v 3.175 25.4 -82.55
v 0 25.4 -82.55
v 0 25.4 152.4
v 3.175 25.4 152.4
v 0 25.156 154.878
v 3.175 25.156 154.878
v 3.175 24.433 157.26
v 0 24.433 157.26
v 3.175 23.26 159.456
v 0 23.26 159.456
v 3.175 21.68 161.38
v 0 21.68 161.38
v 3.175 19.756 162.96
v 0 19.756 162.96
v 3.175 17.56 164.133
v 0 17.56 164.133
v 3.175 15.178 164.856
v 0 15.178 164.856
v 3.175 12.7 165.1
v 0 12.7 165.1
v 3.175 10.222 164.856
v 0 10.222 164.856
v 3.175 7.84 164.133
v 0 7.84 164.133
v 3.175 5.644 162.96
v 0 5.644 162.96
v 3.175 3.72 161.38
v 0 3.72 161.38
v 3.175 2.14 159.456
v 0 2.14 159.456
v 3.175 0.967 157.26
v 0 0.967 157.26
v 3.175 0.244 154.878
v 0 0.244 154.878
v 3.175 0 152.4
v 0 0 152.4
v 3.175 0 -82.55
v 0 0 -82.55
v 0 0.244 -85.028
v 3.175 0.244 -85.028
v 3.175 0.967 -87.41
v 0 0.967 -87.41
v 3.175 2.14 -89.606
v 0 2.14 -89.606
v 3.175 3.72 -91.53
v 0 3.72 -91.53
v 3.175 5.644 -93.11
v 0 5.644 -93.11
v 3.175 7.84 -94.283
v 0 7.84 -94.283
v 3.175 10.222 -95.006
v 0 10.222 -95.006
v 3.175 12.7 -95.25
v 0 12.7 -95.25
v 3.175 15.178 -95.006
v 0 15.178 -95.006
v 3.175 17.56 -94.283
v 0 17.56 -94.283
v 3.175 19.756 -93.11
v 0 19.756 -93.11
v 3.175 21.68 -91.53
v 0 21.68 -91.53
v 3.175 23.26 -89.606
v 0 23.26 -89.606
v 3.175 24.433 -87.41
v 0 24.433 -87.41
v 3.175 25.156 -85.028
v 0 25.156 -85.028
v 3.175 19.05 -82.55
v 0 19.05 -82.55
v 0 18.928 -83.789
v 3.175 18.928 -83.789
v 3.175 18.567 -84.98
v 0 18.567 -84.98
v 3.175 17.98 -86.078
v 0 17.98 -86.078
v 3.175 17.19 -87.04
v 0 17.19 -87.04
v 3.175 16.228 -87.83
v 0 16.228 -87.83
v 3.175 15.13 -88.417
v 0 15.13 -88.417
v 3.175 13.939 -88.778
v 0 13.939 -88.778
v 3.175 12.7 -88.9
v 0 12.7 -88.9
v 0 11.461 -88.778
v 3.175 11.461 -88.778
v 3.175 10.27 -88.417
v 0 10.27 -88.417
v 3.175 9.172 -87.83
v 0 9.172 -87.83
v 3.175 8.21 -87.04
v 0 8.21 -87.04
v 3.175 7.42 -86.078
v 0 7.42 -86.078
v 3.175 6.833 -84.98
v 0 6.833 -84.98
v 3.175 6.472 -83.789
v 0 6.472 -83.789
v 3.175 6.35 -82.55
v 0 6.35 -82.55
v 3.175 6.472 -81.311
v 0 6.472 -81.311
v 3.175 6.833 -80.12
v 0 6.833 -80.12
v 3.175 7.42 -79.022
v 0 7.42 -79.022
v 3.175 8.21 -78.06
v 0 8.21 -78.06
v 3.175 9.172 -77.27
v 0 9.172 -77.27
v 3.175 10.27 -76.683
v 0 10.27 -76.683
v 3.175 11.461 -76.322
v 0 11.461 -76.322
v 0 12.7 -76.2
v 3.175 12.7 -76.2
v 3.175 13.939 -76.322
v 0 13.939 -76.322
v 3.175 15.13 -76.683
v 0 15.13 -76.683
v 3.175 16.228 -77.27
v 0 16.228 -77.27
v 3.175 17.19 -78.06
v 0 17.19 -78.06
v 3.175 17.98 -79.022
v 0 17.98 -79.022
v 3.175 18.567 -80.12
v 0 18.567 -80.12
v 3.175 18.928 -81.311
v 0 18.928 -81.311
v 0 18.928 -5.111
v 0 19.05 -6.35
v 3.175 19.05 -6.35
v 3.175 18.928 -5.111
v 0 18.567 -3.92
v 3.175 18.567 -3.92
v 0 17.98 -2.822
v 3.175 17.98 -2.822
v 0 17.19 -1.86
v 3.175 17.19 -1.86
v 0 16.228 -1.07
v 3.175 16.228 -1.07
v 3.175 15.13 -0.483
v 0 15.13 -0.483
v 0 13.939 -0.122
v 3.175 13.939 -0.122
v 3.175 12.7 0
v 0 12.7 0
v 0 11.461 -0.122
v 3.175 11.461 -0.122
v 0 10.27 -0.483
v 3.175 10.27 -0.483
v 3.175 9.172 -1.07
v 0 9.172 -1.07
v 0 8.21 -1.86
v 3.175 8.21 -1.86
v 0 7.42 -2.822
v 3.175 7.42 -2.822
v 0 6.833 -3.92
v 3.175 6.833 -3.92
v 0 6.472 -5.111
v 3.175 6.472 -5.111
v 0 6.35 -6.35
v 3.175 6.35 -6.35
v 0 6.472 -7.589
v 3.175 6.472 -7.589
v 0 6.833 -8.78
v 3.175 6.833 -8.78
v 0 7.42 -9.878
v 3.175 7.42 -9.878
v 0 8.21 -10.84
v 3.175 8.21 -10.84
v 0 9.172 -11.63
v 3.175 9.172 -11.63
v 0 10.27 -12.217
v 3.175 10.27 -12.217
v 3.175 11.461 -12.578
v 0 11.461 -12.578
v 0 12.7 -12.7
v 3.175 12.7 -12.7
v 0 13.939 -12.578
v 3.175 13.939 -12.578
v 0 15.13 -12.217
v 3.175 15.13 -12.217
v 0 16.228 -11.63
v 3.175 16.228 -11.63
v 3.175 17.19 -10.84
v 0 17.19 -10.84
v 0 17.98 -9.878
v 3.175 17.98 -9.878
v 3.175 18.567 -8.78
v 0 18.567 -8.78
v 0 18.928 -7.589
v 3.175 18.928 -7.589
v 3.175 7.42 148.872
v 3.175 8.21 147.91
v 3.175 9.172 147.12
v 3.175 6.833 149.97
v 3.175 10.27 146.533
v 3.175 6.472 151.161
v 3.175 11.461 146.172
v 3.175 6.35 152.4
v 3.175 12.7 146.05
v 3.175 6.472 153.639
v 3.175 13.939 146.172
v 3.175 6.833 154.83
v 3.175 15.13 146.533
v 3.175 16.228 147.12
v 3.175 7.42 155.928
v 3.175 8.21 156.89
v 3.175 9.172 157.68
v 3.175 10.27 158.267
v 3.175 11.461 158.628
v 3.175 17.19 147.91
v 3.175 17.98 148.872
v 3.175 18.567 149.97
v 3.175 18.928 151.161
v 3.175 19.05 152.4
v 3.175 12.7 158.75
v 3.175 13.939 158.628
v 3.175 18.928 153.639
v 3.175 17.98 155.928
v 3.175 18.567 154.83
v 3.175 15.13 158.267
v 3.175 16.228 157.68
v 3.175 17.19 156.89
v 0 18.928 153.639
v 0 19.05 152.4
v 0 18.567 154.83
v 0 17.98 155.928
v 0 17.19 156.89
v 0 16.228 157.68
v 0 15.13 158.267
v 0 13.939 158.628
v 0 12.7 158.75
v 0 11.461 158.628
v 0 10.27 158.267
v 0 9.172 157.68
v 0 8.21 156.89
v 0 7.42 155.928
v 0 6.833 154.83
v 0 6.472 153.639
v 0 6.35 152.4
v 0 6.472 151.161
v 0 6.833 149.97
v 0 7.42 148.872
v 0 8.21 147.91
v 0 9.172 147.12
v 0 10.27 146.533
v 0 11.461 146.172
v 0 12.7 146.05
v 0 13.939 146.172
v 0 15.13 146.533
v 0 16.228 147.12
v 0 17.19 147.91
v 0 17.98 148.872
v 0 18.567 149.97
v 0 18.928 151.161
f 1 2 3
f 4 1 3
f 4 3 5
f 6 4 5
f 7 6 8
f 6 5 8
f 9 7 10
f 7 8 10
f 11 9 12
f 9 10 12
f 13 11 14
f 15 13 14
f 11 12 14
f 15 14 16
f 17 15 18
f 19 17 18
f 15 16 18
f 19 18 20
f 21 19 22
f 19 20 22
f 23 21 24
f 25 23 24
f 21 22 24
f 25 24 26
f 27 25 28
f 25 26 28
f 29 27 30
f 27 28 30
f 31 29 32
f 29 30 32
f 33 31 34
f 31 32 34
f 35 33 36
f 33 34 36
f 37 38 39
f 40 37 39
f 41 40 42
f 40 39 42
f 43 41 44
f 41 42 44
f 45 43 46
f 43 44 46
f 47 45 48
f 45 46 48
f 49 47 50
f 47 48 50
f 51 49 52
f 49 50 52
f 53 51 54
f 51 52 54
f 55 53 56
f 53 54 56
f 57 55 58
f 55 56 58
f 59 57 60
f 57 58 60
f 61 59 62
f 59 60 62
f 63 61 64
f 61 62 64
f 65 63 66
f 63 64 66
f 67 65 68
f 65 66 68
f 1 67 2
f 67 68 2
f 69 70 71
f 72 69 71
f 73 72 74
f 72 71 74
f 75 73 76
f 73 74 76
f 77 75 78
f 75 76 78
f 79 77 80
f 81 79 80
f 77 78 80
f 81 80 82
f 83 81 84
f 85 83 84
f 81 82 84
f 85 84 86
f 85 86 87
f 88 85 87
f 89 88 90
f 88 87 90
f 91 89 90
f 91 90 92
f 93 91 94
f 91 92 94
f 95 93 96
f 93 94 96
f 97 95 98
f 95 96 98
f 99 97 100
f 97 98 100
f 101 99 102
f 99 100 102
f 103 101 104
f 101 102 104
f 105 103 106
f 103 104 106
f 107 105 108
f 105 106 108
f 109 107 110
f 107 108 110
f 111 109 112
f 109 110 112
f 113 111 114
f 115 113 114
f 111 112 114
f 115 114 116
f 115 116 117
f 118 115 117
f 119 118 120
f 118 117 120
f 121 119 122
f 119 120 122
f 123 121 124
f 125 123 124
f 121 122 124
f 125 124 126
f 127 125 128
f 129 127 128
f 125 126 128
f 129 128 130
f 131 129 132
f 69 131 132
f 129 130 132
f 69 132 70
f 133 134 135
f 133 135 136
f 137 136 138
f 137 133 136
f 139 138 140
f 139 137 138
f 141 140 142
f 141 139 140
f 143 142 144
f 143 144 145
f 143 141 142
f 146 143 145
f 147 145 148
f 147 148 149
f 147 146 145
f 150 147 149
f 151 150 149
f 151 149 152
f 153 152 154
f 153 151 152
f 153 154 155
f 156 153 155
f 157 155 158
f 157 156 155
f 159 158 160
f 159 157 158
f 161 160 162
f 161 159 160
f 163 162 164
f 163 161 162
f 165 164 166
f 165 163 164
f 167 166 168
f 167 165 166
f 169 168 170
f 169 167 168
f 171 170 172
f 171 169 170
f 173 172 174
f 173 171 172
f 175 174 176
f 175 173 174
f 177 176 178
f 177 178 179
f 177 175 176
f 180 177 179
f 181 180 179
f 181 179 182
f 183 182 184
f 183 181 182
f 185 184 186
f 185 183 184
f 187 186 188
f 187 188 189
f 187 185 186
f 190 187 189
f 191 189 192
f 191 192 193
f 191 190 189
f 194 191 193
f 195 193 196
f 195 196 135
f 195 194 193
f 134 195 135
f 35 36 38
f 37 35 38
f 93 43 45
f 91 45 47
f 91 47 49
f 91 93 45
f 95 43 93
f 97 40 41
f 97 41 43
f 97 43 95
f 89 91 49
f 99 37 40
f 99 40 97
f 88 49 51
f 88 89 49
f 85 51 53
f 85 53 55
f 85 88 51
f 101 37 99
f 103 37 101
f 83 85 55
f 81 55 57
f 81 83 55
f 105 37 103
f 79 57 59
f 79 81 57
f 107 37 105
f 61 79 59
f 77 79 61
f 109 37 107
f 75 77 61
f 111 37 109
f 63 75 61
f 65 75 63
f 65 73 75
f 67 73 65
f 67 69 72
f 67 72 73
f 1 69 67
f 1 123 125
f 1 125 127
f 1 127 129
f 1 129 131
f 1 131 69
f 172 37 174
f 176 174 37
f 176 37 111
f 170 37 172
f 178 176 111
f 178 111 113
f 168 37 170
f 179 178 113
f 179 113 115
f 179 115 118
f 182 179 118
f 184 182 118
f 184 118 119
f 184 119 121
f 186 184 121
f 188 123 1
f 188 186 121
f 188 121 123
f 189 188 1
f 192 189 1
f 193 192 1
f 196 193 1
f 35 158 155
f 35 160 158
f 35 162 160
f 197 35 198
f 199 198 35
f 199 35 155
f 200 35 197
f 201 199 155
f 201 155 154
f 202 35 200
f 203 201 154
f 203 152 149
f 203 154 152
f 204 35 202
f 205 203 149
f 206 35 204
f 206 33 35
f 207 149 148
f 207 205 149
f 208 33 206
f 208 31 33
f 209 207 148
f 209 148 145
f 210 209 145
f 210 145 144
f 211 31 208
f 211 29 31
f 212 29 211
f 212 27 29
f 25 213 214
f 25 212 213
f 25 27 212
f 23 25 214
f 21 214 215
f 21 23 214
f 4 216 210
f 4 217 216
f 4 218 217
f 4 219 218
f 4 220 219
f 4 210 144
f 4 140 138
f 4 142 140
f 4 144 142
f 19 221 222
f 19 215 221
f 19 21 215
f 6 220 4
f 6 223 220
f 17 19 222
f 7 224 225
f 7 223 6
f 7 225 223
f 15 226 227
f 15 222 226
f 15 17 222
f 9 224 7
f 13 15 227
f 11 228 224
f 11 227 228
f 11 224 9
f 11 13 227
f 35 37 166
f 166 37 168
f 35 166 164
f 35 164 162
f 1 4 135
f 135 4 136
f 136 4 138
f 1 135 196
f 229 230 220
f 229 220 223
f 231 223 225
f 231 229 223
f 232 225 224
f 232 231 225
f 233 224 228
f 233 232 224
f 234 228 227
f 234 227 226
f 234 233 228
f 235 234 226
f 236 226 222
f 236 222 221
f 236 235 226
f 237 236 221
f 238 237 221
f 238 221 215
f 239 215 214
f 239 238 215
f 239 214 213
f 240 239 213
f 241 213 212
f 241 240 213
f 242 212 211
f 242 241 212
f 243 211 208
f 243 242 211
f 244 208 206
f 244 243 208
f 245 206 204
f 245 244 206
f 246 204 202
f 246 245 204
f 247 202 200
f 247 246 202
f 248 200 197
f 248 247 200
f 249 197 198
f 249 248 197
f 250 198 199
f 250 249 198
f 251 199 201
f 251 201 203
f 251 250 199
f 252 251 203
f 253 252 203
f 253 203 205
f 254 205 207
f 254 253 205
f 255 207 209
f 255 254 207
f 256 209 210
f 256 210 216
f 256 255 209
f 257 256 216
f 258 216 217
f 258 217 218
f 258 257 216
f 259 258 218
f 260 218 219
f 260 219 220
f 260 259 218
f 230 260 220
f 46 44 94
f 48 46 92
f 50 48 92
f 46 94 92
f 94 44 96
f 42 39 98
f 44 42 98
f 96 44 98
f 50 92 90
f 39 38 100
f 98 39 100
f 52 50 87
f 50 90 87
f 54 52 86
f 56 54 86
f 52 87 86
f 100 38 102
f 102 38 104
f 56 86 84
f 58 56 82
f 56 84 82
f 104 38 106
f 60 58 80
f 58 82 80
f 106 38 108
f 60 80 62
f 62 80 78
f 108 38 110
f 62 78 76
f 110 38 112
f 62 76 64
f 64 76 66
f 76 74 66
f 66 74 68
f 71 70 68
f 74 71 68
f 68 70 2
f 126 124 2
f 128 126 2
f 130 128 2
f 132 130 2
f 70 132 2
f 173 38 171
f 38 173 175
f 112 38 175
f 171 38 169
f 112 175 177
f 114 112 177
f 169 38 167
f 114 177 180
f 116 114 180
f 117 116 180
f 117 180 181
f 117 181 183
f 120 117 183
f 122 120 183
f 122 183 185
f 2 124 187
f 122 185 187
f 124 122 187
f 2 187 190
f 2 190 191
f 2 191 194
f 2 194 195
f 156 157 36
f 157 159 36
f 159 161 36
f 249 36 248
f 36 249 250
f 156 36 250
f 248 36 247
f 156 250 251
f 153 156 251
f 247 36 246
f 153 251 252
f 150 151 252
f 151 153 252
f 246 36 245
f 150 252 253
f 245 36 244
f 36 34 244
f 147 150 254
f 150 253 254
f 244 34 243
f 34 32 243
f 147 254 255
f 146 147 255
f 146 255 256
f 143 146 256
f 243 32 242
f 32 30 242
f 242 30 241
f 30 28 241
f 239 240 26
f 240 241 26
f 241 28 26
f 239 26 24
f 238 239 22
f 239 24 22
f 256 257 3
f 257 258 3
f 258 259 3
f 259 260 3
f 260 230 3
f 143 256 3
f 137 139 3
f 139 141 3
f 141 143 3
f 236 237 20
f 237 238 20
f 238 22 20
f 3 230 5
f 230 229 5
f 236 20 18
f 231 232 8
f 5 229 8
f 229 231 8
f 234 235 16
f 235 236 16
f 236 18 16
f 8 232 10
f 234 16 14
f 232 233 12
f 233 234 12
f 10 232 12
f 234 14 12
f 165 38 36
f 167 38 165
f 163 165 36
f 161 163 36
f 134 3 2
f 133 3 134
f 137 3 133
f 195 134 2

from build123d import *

# Parameters (mm, degrees)
F0_R     = 6.35
F1_DEPTH = 3.175


with BuildPart() as f1:
    # F0 (on Right) → F1 (new body)
    with BuildSketch(Plane.YZ):
        with BuildLine():
            Line((0, 152.4), (0, 0))
            Line((0, 0), (0, -82.55))
            Line((0, -82.55), (6.35, -82.55))
            ThreePointArc((6.35, -82.55), (12.7, -76.2), (19.05, -82.55))
            Line((19.05, -82.55), (25.4, -82.55))
            Line((25.4, -82.55), (25.4, -9.525))
            Line((25.4, -9.525), (25.4, 6.007355))
            Line((25.4, 6.007355), (25.4, 152.4))
            ThreePointArc((25.4, 152.4), (12.7, 165.1), (0, 152.4))
        make_face()
        with Locations((12.7, -6.35)):
            Circle(F0_R, mode=Mode.SUBTRACT)
        with Locations((12.7, 152.4)):
            Circle(F0_R, mode=Mode.SUBTRACT)
        with BuildLine():
            Line((6.35, -82.55), (0, -82.55))
            ThreePointArc((0, -82.55), (12.7, -95.25), (25.4, -82.55))
            Line((25.4, -82.55), (19.05, -82.55))
            ThreePointArc((19.05, -82.55), (12.7, -88.9), (6.35, -82.55))
        make_face()
    extrude(amount=F1_DEPTH)


solid = f1.part
